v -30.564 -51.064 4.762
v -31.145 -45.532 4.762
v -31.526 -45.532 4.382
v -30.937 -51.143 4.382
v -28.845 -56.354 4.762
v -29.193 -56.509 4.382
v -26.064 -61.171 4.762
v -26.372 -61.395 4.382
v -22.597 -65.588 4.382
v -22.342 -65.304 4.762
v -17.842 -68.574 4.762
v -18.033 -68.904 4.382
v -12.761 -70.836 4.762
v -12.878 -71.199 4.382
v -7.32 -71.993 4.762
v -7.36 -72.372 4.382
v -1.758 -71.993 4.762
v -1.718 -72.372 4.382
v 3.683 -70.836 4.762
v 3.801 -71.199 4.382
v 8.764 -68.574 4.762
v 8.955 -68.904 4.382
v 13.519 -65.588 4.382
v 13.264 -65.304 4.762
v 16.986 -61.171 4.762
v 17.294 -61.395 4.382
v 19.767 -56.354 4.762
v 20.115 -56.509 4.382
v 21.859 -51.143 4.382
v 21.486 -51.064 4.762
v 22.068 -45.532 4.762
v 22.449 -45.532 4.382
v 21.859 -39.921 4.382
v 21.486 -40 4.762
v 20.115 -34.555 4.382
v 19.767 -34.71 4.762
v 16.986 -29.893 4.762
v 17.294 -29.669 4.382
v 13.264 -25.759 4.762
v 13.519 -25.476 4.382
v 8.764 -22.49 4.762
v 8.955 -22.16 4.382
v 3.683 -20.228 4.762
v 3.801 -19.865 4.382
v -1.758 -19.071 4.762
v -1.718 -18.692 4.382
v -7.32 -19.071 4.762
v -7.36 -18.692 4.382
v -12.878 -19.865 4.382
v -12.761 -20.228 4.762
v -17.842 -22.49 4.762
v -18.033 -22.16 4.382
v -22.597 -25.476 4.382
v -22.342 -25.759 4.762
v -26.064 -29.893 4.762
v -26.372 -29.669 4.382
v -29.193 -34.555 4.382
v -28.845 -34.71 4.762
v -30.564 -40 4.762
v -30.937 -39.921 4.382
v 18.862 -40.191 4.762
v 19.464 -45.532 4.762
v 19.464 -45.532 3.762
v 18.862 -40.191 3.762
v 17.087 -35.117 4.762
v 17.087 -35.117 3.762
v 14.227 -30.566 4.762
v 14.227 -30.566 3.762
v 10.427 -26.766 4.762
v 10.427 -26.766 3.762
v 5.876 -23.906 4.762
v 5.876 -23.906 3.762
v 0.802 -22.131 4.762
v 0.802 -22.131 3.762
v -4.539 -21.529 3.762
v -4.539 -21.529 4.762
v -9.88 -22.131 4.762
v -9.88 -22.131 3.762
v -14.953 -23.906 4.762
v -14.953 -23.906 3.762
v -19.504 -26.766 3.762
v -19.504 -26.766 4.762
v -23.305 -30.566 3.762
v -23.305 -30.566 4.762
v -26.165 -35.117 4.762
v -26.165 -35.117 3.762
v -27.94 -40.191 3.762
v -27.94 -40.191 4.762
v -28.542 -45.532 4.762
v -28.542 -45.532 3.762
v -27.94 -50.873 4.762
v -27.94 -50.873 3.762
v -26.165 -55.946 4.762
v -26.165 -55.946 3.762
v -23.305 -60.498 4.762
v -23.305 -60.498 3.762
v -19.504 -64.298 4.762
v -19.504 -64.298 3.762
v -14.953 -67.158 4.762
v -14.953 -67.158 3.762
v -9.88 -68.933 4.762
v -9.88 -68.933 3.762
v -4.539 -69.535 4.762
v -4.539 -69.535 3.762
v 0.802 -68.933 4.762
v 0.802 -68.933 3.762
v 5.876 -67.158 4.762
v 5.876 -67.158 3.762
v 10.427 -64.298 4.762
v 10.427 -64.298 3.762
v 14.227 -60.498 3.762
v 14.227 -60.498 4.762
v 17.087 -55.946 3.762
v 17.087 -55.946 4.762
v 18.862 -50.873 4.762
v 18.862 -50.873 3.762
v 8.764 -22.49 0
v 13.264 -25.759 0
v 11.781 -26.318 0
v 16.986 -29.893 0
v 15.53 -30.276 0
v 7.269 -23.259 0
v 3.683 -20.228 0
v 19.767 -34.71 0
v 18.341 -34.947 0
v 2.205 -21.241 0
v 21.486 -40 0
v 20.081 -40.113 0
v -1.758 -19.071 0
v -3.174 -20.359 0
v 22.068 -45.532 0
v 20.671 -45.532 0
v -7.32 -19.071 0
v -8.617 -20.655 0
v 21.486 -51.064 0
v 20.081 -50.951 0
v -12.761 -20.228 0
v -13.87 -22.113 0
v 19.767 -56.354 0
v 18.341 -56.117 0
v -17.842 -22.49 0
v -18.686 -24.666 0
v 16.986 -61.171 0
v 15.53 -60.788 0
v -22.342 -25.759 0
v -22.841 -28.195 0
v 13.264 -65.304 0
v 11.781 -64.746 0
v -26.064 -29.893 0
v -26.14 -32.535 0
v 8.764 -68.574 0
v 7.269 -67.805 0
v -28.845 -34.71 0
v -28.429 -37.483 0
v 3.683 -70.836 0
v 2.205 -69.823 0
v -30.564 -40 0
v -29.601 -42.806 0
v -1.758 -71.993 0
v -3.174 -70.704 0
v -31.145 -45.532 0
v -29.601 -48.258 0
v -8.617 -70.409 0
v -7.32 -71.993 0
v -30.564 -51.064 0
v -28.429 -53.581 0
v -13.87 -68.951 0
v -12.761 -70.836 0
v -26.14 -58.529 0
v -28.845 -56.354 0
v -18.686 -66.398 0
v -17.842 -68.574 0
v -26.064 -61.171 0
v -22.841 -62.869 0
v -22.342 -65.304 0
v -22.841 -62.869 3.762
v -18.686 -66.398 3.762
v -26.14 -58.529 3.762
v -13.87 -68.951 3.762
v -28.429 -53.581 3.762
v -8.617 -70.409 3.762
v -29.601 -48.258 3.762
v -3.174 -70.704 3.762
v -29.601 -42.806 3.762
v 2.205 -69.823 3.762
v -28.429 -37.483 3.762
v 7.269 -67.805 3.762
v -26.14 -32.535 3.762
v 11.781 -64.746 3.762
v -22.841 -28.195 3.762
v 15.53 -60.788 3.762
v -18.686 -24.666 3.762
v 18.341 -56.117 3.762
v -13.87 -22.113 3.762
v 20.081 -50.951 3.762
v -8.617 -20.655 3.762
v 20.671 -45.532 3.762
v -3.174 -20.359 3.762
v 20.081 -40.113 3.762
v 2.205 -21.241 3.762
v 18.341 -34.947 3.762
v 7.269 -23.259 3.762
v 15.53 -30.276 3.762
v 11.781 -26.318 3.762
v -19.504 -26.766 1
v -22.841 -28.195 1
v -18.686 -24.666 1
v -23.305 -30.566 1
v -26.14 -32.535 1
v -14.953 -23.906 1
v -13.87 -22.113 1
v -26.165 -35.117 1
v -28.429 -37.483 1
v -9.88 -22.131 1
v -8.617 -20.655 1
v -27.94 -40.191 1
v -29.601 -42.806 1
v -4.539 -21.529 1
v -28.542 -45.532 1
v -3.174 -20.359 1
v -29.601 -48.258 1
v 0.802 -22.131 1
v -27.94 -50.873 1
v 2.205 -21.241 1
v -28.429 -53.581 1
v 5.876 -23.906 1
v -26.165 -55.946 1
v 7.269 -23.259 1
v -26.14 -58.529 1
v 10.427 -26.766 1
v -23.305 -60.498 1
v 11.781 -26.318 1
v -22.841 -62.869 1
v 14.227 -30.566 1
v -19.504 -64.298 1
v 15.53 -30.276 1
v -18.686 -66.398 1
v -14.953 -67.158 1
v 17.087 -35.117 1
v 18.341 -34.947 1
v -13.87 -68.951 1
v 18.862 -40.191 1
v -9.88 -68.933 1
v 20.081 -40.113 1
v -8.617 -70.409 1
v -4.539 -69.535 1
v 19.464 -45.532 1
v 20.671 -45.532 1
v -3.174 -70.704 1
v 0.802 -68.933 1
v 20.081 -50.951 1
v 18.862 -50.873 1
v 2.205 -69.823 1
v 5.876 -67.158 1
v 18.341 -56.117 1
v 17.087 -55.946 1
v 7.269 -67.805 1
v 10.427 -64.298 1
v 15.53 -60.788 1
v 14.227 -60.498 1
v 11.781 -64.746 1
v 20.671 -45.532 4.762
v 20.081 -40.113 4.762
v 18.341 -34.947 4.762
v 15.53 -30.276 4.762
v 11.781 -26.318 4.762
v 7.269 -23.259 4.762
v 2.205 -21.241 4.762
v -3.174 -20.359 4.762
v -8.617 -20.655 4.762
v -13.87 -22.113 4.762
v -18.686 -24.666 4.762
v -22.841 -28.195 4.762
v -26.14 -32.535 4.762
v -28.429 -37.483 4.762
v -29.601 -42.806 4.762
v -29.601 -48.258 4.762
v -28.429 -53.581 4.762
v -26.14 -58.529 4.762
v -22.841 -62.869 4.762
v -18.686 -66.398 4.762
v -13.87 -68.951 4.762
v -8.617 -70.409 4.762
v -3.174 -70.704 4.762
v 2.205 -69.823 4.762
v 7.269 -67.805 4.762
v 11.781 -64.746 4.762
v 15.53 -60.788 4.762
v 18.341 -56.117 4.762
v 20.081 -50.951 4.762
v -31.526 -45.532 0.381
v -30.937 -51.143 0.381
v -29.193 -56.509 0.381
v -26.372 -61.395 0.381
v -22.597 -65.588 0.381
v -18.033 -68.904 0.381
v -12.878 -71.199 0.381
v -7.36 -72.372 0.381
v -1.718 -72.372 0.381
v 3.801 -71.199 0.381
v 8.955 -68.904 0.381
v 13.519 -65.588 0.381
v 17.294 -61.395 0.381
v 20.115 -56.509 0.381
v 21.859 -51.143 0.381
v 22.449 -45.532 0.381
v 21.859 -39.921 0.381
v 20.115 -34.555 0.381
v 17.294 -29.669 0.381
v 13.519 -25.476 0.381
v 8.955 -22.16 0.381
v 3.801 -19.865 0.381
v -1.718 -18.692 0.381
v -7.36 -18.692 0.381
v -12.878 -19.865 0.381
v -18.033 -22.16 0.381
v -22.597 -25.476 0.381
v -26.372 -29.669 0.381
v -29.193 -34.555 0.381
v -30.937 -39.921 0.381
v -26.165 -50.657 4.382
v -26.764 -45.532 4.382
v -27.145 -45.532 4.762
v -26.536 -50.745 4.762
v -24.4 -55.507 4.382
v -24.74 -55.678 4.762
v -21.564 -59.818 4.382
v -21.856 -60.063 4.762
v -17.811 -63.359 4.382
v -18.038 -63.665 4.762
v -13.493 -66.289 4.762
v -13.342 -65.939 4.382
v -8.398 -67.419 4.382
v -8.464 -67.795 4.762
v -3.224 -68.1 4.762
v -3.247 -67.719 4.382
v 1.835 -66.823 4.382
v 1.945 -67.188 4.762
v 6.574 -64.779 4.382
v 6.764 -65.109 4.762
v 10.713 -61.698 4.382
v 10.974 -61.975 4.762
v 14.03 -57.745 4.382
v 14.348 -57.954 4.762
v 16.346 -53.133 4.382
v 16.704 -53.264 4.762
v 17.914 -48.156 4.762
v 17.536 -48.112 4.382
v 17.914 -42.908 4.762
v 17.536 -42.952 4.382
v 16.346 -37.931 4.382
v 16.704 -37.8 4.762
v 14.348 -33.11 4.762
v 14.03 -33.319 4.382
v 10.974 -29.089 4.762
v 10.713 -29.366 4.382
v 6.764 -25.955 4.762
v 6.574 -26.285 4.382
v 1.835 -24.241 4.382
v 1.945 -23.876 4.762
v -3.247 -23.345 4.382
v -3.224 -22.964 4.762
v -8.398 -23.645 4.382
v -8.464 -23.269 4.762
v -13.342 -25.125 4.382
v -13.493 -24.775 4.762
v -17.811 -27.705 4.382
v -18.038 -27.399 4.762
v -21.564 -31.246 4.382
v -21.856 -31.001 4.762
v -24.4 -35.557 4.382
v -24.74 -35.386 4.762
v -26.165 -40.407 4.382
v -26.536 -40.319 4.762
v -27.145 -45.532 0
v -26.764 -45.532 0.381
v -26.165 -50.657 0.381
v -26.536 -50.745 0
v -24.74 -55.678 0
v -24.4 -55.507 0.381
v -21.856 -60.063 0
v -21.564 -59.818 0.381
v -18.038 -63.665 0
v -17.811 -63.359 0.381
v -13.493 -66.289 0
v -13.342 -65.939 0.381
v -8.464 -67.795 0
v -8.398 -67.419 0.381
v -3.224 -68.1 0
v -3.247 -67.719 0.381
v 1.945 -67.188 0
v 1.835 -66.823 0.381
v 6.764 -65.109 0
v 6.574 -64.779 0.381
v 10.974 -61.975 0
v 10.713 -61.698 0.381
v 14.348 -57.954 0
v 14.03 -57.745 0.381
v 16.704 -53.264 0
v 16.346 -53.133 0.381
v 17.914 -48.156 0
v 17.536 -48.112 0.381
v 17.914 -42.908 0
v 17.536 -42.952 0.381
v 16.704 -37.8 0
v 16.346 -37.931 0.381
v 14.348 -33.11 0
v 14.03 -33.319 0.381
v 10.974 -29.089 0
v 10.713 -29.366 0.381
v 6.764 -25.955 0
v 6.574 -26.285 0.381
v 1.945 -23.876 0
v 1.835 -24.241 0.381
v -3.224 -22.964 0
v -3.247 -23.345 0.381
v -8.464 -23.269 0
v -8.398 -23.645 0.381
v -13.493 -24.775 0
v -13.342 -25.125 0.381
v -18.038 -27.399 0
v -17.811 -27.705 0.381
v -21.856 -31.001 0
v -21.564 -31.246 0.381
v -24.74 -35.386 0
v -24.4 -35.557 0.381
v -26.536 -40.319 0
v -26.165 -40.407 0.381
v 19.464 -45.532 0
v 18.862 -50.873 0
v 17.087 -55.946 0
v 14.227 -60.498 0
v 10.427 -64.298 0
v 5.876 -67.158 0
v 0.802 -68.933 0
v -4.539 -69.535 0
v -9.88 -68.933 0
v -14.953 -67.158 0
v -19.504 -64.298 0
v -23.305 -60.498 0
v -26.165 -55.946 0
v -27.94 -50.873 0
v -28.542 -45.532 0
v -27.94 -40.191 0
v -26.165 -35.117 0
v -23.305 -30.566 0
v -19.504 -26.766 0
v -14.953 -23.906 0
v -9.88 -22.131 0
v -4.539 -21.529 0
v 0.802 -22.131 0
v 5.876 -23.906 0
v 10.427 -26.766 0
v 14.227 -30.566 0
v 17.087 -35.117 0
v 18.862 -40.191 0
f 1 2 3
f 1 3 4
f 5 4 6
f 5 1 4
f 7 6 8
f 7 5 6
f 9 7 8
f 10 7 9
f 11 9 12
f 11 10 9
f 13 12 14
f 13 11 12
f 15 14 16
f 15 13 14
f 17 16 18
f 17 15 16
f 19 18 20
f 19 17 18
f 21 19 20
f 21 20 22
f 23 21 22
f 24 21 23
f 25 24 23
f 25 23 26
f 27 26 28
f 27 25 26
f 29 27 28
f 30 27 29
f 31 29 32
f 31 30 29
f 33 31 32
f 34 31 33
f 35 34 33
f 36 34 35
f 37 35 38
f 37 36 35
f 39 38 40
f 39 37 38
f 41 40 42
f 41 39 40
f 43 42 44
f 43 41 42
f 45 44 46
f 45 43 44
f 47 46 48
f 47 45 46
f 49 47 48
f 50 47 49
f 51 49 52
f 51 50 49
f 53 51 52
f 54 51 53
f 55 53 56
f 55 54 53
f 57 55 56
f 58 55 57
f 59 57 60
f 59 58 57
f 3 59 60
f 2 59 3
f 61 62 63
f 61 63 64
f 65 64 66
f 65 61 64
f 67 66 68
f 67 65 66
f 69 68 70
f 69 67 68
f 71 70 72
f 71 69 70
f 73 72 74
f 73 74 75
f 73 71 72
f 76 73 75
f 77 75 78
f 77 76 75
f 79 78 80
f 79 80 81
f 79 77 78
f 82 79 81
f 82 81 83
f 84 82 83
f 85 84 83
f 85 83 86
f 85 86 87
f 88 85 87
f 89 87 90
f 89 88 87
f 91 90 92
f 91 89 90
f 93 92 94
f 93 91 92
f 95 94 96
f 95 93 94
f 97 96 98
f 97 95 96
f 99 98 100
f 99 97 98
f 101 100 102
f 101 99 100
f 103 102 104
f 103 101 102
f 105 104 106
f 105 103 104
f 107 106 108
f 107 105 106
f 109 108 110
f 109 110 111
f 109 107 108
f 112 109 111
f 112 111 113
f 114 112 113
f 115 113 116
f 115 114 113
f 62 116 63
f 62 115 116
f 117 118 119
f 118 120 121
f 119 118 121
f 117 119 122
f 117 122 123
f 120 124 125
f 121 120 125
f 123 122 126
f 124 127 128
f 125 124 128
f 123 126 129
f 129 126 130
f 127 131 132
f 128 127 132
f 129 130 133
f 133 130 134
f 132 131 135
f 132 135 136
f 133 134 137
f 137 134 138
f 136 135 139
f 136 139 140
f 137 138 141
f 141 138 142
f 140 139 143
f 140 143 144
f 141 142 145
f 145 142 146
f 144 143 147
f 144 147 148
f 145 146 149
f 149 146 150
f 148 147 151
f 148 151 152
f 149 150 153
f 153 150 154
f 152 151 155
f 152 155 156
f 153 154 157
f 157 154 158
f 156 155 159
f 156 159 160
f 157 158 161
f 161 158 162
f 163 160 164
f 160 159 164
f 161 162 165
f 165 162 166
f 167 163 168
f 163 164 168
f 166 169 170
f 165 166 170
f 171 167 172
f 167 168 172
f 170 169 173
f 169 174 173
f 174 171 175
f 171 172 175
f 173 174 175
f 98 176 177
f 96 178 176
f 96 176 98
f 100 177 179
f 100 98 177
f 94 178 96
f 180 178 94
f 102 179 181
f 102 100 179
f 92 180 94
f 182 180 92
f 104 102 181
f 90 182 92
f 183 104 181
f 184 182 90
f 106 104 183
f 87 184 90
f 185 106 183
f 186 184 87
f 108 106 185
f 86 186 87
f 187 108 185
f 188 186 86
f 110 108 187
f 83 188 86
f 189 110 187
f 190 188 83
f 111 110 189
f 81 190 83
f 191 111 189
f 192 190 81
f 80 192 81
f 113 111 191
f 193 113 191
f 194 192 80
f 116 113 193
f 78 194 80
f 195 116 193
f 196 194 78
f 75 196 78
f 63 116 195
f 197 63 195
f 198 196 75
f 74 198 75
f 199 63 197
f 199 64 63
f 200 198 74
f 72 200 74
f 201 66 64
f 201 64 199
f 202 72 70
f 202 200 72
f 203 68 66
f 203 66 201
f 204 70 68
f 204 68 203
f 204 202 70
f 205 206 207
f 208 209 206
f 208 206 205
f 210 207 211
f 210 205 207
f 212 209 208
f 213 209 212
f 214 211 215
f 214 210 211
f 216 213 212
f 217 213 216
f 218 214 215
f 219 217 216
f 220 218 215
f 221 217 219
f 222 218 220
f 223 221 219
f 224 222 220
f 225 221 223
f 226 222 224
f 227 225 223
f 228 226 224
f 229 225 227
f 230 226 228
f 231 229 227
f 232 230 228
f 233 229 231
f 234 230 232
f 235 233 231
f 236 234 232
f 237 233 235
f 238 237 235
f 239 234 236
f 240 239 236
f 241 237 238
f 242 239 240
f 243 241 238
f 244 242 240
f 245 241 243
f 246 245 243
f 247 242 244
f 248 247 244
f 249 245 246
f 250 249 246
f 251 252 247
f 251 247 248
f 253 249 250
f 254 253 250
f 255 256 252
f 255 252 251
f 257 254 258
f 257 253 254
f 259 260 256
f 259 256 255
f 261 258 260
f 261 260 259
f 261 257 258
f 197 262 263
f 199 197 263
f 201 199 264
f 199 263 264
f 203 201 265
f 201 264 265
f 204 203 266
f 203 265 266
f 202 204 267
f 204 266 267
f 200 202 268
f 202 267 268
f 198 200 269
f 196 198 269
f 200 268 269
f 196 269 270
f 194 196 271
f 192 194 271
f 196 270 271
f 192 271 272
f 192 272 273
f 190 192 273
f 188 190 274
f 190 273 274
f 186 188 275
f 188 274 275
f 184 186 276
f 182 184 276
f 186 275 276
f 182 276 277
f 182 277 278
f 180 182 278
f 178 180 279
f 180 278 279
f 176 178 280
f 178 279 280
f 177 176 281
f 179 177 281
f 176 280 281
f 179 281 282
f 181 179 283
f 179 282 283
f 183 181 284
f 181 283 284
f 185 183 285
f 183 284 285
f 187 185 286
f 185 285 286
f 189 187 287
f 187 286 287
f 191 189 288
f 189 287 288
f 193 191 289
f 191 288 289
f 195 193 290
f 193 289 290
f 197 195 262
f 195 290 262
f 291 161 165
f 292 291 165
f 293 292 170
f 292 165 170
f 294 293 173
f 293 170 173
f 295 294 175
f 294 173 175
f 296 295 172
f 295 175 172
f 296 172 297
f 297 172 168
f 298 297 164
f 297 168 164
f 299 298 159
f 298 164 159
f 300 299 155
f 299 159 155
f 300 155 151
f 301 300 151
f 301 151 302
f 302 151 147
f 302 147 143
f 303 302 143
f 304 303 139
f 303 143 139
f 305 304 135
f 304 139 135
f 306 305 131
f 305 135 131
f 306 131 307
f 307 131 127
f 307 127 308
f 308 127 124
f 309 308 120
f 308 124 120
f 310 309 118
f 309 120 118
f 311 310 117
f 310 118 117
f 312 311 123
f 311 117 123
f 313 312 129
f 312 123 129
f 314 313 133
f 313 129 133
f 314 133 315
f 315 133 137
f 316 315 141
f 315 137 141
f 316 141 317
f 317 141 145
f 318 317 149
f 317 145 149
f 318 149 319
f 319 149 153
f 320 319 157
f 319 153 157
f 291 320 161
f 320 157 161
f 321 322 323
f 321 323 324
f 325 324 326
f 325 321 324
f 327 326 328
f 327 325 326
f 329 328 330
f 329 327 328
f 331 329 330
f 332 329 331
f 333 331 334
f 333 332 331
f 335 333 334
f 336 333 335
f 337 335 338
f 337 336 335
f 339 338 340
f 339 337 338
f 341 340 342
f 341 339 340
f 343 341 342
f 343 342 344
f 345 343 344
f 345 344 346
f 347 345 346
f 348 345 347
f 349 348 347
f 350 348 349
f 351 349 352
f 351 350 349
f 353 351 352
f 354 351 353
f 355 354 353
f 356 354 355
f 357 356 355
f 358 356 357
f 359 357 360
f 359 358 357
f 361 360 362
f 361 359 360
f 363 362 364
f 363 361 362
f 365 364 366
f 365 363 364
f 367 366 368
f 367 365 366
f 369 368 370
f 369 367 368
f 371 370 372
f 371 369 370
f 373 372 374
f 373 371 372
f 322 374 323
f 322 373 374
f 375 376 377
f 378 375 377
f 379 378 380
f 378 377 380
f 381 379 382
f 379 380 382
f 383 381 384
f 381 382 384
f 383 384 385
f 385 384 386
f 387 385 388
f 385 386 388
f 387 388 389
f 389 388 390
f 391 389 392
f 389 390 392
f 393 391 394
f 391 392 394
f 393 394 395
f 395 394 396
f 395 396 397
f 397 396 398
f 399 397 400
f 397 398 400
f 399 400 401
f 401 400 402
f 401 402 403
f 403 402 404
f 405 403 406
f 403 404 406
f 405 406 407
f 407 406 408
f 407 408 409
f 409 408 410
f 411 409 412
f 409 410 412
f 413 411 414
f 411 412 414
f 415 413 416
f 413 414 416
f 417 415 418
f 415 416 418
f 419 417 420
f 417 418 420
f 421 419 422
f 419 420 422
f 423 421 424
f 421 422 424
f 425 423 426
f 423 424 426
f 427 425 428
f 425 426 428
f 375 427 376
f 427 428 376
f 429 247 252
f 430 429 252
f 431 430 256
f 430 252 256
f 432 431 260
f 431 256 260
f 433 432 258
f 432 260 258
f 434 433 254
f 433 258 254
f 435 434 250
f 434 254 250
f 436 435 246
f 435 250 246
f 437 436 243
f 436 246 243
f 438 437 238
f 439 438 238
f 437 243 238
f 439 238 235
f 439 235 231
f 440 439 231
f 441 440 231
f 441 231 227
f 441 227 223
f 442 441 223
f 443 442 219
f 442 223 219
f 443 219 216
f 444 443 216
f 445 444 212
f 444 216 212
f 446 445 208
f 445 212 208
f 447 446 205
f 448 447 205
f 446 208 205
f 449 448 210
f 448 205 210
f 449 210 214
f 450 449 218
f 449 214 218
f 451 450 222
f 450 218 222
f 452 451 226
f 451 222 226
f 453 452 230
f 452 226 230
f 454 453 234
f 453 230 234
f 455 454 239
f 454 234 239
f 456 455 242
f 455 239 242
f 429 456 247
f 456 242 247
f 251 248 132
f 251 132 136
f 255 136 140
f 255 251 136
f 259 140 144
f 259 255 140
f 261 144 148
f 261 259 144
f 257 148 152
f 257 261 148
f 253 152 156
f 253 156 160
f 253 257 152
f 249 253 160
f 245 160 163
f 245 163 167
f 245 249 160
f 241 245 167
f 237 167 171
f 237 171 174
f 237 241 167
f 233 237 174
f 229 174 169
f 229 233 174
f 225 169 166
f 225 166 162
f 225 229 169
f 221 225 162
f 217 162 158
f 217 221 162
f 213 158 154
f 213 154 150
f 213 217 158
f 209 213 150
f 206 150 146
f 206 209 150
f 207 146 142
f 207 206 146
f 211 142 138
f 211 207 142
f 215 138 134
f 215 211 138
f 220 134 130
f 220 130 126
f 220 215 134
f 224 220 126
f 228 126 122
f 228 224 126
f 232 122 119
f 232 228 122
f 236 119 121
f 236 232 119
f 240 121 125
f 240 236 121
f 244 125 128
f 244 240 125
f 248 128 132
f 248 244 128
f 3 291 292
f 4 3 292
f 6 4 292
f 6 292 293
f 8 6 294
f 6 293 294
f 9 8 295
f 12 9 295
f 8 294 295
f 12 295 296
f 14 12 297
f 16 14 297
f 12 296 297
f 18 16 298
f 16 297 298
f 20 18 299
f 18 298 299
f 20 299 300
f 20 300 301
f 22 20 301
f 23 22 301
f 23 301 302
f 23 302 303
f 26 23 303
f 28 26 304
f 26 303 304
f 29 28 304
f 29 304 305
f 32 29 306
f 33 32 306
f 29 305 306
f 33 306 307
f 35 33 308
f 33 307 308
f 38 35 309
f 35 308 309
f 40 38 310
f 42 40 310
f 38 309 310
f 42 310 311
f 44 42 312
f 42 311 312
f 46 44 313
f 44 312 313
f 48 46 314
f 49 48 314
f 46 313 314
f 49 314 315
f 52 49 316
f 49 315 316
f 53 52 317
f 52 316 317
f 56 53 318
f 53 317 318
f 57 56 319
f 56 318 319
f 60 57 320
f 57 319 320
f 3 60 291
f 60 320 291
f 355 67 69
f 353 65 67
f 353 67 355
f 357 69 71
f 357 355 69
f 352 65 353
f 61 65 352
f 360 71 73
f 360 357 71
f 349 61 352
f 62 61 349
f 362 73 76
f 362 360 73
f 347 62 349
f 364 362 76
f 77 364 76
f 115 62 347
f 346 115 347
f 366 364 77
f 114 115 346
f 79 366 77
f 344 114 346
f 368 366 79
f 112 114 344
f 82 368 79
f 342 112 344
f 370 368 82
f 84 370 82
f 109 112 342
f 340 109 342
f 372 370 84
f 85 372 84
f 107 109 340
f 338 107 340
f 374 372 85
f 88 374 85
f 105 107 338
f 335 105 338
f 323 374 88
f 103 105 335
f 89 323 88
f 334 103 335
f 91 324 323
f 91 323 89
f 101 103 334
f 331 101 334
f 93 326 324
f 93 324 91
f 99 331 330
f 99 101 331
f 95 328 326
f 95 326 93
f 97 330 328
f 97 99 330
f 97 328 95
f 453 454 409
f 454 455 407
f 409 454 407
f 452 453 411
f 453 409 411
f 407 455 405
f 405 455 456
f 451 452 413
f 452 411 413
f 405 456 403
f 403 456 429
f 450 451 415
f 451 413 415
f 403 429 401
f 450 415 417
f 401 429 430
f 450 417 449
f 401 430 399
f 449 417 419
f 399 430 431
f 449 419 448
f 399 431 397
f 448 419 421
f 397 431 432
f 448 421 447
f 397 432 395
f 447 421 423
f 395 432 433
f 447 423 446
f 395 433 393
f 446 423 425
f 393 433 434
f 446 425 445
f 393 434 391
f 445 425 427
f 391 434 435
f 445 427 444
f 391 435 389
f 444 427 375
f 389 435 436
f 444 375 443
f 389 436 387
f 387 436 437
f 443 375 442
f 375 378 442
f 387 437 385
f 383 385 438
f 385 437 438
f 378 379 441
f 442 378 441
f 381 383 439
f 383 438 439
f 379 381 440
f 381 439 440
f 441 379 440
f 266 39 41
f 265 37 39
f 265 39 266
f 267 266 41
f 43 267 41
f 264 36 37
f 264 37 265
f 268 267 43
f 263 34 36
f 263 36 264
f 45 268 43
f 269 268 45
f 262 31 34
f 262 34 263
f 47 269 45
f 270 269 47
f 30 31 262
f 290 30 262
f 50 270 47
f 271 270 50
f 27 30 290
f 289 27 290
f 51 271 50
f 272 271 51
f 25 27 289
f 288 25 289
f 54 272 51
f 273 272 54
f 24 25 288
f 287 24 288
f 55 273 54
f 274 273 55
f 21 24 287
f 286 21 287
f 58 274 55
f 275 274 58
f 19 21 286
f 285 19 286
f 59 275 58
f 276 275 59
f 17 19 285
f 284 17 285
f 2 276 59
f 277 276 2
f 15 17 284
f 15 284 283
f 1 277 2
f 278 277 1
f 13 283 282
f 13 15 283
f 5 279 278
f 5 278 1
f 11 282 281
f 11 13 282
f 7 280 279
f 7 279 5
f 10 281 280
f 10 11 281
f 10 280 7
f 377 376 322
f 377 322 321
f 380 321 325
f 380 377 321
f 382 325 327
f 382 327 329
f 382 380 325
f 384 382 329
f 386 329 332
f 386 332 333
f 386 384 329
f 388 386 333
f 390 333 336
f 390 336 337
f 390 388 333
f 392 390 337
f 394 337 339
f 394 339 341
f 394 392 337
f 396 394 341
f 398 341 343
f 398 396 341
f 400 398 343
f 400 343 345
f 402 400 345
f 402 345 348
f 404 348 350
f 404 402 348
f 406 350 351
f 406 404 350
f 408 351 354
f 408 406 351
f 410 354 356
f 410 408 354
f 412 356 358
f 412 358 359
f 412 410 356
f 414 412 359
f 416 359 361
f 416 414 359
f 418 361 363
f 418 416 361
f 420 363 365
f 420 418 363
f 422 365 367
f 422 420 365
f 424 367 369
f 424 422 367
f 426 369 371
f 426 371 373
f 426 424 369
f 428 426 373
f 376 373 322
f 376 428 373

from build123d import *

# Parameters (mm, degrees)
SKETCH1_R          = 26.9875
SKETCH1_R_2        = 22.225
EXTRUDE1_DEPTH     = 4.7625
SKETCH2_R          = 25.2095
SKETCH2_R_2        = 24.003
CUT_EXTRUDE1_DEPTH = 1
CUT_EXTRUDE2_START = -1
SKETCH3_R          = 25.2095
SKETCH3_R_2        = 24.003
CUT_EXTRUDE2_DEPTH = 1
CHAMFER1_SIZE      = 0.381


with BuildPart() as part:
    # Sketch1 → Extrude1 (new body)
    with BuildSketch(Plane.XY):
        with Locations(Location((-4.538848476, -45.531959332, 0), (0, 0, 180))):
            Circle(SKETCH1_R)
        with Locations(Location((-4.538848476, -45.531959332, 0), (0, 0, 180))):
            Circle(SKETCH1_R_2, mode=Mode.SUBTRACT)
    extrude(amount=EXTRUDE1_DEPTH)

    # Sketch2 → Cut-Extrude1 (cut)
    with BuildSketch(Plane.XY.offset(4.7625)):
        with Locations((-4.538848476, -45.531959332)):
            Circle(SKETCH2_R)
        with Locations((-4.538848476, -45.531959332)):
            Circle(SKETCH2_R_2, mode=Mode.SUBTRACT)
    extrude(amount=-CUT_EXTRUDE1_DEPTH, mode=Mode.SUBTRACT)

    # Sketch3 → Cut-Extrude2 (cut)
    with BuildSketch(Plane(origin=(0, 0, 0), x_dir=(-1, 0, 0), z_dir=(0, 0, -1)).offset(CUT_EXTRUDE2_START)):
        with Locations(Location((4.538848476, -45.531959332, 0), (0, 0, 180))):
            Circle(SKETCH3_R)
        with Locations(Location((4.538848476, -45.531959332, 0), (0, 0, 180))):
            Circle(SKETCH3_R_2, mode=Mode.SUBTRACT)
    extrude(amount=CUT_EXTRUDE2_DEPTH, mode=Mode.SUBTRACT)

    # Chamfer1
    chamfer1_edges = [part.edges().sort_by_distance(p)[0] for p in [
        (22.448651524, -45.531959332, 0),
        (22.448651524, -45.531959332, 4.7625),
        (17.686151524, -45.531959332, 0),
        (17.686151524, -45.531959332, 4.7625),
    ]]
    chamfer(chamfer1_edges, length=CHAMFER1_SIZE)


solid = part.part
